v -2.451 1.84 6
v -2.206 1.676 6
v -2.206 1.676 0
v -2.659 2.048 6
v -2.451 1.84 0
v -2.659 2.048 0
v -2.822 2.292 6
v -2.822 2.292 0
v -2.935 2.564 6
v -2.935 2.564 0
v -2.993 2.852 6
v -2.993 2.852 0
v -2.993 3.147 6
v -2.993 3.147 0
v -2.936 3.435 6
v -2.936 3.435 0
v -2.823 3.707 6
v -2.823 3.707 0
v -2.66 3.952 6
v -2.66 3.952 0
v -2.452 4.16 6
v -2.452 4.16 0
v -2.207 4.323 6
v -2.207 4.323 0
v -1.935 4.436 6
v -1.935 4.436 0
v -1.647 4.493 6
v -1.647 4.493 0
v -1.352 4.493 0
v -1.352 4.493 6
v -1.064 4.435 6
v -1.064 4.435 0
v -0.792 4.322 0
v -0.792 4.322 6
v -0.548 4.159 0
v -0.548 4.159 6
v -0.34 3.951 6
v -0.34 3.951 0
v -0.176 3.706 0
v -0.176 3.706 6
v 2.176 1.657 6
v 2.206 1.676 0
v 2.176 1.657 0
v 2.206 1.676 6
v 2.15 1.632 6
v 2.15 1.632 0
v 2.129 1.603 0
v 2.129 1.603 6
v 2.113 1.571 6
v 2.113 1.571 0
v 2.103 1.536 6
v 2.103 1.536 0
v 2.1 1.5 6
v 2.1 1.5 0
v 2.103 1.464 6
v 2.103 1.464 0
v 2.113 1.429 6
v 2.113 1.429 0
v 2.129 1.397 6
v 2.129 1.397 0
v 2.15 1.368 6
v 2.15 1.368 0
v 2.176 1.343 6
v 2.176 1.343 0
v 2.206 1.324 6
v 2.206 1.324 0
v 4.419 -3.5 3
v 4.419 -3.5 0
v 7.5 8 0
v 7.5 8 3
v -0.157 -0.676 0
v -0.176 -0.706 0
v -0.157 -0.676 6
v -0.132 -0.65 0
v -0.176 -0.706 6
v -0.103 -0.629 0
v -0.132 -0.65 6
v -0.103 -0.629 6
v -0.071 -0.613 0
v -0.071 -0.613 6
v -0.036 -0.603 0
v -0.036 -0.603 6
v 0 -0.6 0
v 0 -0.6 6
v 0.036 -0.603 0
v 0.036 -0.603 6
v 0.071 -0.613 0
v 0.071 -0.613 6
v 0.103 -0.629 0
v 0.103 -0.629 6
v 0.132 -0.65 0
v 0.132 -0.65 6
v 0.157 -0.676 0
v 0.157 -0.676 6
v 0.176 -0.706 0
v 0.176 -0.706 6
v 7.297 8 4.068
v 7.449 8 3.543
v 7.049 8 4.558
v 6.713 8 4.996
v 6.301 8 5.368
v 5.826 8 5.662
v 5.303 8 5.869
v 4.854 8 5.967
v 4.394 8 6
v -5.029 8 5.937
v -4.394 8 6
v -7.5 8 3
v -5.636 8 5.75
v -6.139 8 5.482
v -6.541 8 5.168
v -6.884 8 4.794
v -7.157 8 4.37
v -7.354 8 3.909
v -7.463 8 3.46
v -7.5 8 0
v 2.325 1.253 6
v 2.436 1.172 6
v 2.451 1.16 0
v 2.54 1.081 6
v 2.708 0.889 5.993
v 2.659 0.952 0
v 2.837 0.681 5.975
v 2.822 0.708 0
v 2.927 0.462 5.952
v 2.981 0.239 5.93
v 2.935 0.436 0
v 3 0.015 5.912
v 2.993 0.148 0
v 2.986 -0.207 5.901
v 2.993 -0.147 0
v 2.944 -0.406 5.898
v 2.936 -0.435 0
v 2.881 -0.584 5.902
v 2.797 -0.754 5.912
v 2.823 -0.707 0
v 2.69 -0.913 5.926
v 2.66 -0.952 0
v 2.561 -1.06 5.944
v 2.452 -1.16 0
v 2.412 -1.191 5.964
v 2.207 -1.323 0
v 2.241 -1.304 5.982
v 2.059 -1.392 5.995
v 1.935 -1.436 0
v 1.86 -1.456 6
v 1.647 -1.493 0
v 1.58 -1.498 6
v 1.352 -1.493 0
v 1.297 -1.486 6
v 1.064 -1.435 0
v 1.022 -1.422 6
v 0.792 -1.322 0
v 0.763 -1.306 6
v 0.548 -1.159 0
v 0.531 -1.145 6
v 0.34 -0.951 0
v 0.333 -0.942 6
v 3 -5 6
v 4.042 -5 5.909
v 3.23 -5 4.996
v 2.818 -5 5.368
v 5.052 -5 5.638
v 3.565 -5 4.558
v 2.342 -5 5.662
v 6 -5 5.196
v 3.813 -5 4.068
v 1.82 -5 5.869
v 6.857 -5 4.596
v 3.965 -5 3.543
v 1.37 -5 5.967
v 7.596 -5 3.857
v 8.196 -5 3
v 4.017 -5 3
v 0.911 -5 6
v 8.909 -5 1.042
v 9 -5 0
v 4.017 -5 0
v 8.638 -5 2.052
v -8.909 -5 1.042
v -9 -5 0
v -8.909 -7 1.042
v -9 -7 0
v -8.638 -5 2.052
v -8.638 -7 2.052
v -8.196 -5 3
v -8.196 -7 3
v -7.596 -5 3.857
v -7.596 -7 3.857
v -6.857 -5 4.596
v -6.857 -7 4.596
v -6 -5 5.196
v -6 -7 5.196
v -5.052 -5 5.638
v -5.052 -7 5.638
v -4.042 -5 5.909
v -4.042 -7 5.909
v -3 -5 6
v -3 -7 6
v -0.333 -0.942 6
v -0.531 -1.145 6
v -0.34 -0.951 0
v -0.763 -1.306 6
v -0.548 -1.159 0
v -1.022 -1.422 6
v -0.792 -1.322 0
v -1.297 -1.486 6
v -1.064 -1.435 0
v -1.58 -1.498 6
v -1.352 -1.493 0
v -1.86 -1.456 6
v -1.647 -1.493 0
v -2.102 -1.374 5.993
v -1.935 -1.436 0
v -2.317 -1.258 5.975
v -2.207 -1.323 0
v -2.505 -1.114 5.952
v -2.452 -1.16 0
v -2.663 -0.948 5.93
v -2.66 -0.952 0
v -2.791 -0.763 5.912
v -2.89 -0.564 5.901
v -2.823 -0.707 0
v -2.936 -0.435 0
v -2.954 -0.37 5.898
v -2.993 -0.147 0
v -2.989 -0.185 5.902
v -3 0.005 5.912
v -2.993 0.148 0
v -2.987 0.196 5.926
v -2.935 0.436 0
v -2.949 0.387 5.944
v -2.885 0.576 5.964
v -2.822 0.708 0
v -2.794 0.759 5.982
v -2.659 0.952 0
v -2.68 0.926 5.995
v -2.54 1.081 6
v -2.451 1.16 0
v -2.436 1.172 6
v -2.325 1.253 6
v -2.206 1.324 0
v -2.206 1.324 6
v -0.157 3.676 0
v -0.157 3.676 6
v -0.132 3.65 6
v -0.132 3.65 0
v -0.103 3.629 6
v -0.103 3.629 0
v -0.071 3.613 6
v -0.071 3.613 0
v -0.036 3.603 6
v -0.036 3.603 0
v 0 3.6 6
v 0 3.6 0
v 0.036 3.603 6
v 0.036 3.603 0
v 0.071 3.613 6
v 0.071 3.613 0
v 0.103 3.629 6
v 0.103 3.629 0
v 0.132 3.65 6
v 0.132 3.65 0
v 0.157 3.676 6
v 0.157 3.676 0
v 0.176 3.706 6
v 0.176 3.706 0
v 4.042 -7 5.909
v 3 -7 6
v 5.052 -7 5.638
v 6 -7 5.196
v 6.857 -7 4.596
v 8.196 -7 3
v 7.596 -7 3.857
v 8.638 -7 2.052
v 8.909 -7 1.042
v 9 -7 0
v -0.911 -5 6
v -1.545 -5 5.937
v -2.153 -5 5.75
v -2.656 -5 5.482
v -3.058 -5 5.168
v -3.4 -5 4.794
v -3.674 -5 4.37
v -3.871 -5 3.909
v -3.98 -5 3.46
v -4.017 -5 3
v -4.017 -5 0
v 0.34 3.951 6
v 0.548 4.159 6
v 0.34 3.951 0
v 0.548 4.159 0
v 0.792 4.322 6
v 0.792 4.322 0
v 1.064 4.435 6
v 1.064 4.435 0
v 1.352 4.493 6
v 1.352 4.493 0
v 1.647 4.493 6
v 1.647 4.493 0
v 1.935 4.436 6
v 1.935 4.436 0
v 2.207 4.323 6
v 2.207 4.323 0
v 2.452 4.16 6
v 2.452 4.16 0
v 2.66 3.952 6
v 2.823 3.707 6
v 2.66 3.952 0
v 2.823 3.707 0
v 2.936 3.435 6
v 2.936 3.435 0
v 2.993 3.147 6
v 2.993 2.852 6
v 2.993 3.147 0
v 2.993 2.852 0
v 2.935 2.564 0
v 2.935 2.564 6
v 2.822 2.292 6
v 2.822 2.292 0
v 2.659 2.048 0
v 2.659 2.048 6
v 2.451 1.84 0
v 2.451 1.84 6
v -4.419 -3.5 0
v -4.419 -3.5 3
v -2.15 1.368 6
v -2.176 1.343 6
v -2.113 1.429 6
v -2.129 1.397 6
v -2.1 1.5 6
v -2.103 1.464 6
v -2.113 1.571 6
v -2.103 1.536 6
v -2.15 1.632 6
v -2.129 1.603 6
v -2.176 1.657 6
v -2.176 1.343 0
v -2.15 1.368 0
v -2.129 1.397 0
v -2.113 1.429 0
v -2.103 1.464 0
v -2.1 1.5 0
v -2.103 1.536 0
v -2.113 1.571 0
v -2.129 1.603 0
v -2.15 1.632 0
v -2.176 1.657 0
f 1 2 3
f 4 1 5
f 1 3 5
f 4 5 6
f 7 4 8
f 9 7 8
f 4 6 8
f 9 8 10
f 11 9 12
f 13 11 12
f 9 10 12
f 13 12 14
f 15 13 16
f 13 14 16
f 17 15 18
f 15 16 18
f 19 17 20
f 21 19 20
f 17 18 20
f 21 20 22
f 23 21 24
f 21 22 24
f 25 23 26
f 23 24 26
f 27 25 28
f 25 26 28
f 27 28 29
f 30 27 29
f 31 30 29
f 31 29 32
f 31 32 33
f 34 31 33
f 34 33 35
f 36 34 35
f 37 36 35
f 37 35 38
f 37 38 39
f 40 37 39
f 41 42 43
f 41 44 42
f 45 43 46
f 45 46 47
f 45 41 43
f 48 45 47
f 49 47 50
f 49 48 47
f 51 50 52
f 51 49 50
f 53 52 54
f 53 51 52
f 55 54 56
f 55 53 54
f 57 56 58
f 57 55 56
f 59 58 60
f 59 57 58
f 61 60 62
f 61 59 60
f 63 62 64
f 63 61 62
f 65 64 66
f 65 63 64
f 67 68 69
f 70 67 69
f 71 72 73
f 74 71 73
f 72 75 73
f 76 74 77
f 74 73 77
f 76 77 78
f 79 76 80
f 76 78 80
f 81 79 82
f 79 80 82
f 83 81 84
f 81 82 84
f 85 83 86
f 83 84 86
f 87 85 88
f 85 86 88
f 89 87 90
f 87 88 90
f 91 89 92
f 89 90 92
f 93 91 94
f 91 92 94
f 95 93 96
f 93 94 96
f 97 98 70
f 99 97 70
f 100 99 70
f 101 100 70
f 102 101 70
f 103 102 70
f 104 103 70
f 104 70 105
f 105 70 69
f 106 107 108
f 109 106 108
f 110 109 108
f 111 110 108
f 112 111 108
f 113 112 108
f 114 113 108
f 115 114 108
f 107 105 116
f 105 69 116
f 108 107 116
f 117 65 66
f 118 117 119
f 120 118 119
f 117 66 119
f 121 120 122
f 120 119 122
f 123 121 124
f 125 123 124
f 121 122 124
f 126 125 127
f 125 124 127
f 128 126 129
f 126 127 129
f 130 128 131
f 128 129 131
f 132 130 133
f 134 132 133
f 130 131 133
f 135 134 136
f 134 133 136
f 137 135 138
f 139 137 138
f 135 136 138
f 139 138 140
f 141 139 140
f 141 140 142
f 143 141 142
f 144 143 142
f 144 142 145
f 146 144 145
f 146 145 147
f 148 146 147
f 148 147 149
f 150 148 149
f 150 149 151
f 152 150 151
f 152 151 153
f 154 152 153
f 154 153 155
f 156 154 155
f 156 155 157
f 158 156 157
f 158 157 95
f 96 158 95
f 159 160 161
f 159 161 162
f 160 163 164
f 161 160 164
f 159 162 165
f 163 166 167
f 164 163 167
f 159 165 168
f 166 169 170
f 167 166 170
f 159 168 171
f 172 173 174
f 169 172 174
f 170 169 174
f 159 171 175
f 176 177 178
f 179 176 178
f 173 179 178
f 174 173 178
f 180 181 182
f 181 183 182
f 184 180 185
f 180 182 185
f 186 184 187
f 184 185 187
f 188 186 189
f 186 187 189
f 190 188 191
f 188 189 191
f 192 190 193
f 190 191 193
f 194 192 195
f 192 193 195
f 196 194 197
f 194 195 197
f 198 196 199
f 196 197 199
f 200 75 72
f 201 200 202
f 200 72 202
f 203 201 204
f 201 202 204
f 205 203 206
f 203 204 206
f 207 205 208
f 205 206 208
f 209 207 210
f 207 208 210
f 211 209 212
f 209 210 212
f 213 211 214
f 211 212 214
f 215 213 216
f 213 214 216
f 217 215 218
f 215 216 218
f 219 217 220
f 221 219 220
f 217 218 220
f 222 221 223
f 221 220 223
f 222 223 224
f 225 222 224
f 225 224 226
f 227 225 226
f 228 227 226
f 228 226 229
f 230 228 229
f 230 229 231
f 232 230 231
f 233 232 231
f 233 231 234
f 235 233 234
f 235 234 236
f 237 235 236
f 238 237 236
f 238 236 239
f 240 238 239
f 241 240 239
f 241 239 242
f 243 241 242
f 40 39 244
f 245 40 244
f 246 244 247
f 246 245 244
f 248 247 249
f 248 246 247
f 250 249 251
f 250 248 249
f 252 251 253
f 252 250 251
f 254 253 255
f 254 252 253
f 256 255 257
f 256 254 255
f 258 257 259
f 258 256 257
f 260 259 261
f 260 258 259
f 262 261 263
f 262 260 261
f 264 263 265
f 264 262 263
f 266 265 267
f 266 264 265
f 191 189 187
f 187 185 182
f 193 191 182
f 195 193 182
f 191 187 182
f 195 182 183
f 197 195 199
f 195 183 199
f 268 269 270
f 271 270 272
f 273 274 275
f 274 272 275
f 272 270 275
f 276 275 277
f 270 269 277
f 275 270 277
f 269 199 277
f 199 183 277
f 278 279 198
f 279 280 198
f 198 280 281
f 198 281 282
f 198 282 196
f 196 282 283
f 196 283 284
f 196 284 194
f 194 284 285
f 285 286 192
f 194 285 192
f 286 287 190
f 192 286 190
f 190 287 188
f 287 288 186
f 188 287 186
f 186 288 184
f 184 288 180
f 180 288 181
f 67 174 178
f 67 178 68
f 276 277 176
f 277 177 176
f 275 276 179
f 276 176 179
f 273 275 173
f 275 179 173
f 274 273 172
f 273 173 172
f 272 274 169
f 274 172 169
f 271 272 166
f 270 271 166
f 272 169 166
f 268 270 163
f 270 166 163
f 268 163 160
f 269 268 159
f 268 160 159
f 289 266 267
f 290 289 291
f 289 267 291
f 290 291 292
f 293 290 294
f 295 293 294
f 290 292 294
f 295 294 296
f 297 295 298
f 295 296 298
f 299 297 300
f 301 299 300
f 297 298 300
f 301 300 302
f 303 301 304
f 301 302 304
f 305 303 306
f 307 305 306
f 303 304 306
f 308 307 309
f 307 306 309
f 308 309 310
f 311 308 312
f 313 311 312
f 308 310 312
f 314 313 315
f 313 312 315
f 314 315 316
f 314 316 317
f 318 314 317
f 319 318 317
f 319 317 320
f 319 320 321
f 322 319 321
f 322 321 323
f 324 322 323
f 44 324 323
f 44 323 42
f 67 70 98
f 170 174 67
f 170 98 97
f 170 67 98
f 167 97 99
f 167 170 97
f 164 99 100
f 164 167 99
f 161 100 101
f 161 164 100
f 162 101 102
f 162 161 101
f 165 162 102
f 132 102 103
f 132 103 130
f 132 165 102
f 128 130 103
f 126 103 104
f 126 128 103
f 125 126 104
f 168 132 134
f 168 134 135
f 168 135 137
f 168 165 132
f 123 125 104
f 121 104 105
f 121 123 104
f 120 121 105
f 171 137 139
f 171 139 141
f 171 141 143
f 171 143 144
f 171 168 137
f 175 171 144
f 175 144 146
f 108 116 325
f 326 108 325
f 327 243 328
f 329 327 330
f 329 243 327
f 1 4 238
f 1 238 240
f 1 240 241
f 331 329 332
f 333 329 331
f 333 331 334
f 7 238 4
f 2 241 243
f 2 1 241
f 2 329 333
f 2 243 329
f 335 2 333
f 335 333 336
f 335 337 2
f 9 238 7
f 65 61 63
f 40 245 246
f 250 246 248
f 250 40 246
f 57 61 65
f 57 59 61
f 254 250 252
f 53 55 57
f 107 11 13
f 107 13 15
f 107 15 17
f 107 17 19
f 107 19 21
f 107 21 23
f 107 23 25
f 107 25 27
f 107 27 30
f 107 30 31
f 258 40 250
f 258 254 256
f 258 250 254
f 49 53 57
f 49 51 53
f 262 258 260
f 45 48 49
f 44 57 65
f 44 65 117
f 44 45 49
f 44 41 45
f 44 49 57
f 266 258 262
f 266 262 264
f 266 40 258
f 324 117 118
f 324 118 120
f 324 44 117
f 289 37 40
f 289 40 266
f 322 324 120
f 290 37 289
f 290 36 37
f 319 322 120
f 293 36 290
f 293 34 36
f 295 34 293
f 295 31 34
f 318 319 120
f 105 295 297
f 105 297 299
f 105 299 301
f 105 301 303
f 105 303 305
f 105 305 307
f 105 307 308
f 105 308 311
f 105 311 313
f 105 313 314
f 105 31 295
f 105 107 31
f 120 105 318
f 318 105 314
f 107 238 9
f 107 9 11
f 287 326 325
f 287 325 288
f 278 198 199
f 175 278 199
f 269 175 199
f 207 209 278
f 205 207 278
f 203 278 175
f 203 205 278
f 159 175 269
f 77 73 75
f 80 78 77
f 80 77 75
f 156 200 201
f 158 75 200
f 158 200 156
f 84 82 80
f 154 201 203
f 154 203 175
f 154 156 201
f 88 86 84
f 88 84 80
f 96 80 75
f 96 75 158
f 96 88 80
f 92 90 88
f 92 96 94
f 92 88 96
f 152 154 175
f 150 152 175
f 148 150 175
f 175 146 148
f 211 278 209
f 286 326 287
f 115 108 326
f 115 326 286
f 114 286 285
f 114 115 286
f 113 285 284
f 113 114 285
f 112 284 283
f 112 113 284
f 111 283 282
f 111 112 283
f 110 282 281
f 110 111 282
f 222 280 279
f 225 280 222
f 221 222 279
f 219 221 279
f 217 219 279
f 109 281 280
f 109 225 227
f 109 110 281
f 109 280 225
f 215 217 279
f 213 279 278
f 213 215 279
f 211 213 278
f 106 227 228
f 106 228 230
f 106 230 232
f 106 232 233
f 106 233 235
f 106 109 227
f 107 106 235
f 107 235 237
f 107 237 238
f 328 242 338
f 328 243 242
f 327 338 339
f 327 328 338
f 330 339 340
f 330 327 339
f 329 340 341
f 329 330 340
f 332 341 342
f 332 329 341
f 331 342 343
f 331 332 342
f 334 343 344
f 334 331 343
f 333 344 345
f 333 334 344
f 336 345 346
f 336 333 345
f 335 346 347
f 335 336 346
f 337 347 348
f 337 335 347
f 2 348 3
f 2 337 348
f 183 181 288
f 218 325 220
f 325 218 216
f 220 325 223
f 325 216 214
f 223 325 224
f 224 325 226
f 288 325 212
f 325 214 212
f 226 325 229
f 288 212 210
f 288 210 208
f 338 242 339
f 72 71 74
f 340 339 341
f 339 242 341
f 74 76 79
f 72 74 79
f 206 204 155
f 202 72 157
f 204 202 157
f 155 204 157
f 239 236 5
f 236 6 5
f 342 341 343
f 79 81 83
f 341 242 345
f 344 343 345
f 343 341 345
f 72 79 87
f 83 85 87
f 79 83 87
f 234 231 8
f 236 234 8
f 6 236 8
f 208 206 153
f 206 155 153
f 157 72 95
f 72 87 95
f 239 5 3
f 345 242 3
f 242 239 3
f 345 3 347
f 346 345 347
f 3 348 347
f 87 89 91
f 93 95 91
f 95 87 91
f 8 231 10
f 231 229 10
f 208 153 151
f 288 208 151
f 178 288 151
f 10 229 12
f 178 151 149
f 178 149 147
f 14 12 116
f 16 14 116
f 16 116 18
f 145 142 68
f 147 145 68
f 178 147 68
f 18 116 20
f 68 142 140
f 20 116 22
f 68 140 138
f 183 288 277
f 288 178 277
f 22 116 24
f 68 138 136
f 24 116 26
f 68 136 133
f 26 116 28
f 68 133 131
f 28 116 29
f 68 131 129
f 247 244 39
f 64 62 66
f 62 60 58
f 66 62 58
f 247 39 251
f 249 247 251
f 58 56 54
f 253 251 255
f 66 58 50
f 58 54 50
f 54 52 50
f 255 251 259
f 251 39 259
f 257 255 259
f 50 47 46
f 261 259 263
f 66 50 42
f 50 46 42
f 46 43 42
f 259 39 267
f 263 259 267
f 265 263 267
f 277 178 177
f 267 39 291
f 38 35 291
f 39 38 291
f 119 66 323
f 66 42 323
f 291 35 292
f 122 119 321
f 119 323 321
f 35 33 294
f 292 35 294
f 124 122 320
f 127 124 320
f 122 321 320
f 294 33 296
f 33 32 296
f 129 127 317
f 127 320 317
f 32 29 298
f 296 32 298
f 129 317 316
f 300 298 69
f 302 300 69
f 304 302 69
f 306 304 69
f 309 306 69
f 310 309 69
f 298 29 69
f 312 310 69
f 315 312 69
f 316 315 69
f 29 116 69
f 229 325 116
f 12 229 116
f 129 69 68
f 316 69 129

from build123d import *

# Parameters (mm, degrees)
F1_DEPTH    = 6
F2_F1_R     = 0.2
F2_F2_R     = 0.2
F3_T4_DEPTH = 28.4585903453
F3_T9_DEPTH = 28.4585903453
F4_R        = 5.99999


# Not quite as in the source:
# - a fillet or chamfer that OpenCascade refuses, or shapes differently, is made with other operations: its cross-section is extruded or revolved along the edge and cut away or added
# - a fillet or chamfer is up to 0.001 mm smaller than in the source, because OpenCascade refuses the exact size


with BuildPart() as f1:
    # F0 (on Top) → F1 (new body)
    with BuildSketch(Plane.XY):
        Polygon((-7.5, 8), (-4.418584287, -3.5), (4.418584287, -3.5), (7.5, 8), align=None)
        with BuildLine():
            ThreePointArc((-1.5, 1.5), (-2.5606601718, 4.0606601718), (0, 3))
            ThreePointArc((0, 3), (2.5606601718, 4.0606601718), (1.5, 1.5))
            ThreePointArc((1.5, 1.5), (2.5606601718, -1.0606601718), (0, 0))
            ThreePointArc((0, 0), (-2.5606601718, -1.0606601718), (-1.5, 1.5))
        make_face(mode=Mode.SUBTRACT)
        Polygon((-9, -5), (-9, -7), (9, -7), (9, -5), (4.0166604984, -5), (-4.0166604984, -5), align=None)
        Polygon((-4.418584287, -3.5), (-4.0166604984, -5), (4.0166604984, -5), (4.418584287, -3.5), align=None)
    extrude(amount=F1_DEPTH)

    # F2: fillet of radius 0.2 on 4 edges, made by hand

    # F2_f1
    f2_f1_edges = [f1.edges().sort_by_distance(p)[0] for p in [
        (-1.5, 1.5, 3),
        (0, 3, 3),
        (1.5, 1.5, 3),
    ]]
    fillet(f2_f1_edges, radius=F2_F1_R)

    # F2_f2
    f2_f2_edges = [f1.edges().sort_by_distance(p)[0] for p in [
        (0, 0, 3),
    ]]
    fillet(f2_f2_edges, radius=F2_F2_R)

    # F3: fillet of radius 3 on 2 edges, made by hand


with BuildPart() as f3_tool2:
    # F3_s3 → F3_t4 (new body)
    with BuildSketch(Plane(origin=(-4.4435475741, 16.5835453123, 0), x_dir=(0, 0, 1), z_dir=(0.2588190451, -0.9659258263, 0))):
        with BuildLine():
            ThreePointArc((3, 5.1738913363), (5.1213203436, 4.2952116799), (6, 2.1738913363))
            Line((6, 2.1738913363), (6, 5.1738913363))
            Line((6, 5.1738913363), (3, 5.1738913363))
        make_face()
    extrude(amount=F3_T4_DEPTH)

    split(bisect_by=Plane.XZ.offset(5), keep=Keep.BOTTOM)


with BuildPart() as f1_1:
    add(f1.part)

    # F3_t1: cut F3_tool2
    add(f3_tool2.part, mode=Mode.SUBTRACT)


with BuildPart() as f3_tool7:
    # F3_s8 → F3_t9 (new body)
    with BuildSketch(Plane(origin=(-2.9220776041, -10.905342082, 0), x_dir=(0, 0, 1), z_dir=(0.2588190451, 0.9659258263, 0))):
        with BuildLine():
            ThreePointArc((3, 5.1738913363), (5.1213203436, 4.2952116799), (6, 2.1738913363))
            Line((6, 2.1738913363), (6, 5.1738913363))
            Line((6, 5.1738913363), (3, 5.1738913363))
        make_face()
    extrude(amount=F3_T9_DEPTH)

    split(bisect_by=Plane.XZ.offset(5), keep=Keep.BOTTOM)


with BuildPart() as f1_2:
    add(f1_1.part)

    # F3_t6: cut F3_tool7
    add(f3_tool7.part, mode=Mode.SUBTRACT)

    # F4 (radius 6 in the source; OpenCascade refuses exactly that, so slightly less here)
    f4_edges = [f1_2.edges().sort_by_distance(p)[0] for p in [
        (9, -6, 6),
        (-9, -6, 6),
    ]]
    fillet(f4_edges, radius=F4_R)


solid = f1_2.part
